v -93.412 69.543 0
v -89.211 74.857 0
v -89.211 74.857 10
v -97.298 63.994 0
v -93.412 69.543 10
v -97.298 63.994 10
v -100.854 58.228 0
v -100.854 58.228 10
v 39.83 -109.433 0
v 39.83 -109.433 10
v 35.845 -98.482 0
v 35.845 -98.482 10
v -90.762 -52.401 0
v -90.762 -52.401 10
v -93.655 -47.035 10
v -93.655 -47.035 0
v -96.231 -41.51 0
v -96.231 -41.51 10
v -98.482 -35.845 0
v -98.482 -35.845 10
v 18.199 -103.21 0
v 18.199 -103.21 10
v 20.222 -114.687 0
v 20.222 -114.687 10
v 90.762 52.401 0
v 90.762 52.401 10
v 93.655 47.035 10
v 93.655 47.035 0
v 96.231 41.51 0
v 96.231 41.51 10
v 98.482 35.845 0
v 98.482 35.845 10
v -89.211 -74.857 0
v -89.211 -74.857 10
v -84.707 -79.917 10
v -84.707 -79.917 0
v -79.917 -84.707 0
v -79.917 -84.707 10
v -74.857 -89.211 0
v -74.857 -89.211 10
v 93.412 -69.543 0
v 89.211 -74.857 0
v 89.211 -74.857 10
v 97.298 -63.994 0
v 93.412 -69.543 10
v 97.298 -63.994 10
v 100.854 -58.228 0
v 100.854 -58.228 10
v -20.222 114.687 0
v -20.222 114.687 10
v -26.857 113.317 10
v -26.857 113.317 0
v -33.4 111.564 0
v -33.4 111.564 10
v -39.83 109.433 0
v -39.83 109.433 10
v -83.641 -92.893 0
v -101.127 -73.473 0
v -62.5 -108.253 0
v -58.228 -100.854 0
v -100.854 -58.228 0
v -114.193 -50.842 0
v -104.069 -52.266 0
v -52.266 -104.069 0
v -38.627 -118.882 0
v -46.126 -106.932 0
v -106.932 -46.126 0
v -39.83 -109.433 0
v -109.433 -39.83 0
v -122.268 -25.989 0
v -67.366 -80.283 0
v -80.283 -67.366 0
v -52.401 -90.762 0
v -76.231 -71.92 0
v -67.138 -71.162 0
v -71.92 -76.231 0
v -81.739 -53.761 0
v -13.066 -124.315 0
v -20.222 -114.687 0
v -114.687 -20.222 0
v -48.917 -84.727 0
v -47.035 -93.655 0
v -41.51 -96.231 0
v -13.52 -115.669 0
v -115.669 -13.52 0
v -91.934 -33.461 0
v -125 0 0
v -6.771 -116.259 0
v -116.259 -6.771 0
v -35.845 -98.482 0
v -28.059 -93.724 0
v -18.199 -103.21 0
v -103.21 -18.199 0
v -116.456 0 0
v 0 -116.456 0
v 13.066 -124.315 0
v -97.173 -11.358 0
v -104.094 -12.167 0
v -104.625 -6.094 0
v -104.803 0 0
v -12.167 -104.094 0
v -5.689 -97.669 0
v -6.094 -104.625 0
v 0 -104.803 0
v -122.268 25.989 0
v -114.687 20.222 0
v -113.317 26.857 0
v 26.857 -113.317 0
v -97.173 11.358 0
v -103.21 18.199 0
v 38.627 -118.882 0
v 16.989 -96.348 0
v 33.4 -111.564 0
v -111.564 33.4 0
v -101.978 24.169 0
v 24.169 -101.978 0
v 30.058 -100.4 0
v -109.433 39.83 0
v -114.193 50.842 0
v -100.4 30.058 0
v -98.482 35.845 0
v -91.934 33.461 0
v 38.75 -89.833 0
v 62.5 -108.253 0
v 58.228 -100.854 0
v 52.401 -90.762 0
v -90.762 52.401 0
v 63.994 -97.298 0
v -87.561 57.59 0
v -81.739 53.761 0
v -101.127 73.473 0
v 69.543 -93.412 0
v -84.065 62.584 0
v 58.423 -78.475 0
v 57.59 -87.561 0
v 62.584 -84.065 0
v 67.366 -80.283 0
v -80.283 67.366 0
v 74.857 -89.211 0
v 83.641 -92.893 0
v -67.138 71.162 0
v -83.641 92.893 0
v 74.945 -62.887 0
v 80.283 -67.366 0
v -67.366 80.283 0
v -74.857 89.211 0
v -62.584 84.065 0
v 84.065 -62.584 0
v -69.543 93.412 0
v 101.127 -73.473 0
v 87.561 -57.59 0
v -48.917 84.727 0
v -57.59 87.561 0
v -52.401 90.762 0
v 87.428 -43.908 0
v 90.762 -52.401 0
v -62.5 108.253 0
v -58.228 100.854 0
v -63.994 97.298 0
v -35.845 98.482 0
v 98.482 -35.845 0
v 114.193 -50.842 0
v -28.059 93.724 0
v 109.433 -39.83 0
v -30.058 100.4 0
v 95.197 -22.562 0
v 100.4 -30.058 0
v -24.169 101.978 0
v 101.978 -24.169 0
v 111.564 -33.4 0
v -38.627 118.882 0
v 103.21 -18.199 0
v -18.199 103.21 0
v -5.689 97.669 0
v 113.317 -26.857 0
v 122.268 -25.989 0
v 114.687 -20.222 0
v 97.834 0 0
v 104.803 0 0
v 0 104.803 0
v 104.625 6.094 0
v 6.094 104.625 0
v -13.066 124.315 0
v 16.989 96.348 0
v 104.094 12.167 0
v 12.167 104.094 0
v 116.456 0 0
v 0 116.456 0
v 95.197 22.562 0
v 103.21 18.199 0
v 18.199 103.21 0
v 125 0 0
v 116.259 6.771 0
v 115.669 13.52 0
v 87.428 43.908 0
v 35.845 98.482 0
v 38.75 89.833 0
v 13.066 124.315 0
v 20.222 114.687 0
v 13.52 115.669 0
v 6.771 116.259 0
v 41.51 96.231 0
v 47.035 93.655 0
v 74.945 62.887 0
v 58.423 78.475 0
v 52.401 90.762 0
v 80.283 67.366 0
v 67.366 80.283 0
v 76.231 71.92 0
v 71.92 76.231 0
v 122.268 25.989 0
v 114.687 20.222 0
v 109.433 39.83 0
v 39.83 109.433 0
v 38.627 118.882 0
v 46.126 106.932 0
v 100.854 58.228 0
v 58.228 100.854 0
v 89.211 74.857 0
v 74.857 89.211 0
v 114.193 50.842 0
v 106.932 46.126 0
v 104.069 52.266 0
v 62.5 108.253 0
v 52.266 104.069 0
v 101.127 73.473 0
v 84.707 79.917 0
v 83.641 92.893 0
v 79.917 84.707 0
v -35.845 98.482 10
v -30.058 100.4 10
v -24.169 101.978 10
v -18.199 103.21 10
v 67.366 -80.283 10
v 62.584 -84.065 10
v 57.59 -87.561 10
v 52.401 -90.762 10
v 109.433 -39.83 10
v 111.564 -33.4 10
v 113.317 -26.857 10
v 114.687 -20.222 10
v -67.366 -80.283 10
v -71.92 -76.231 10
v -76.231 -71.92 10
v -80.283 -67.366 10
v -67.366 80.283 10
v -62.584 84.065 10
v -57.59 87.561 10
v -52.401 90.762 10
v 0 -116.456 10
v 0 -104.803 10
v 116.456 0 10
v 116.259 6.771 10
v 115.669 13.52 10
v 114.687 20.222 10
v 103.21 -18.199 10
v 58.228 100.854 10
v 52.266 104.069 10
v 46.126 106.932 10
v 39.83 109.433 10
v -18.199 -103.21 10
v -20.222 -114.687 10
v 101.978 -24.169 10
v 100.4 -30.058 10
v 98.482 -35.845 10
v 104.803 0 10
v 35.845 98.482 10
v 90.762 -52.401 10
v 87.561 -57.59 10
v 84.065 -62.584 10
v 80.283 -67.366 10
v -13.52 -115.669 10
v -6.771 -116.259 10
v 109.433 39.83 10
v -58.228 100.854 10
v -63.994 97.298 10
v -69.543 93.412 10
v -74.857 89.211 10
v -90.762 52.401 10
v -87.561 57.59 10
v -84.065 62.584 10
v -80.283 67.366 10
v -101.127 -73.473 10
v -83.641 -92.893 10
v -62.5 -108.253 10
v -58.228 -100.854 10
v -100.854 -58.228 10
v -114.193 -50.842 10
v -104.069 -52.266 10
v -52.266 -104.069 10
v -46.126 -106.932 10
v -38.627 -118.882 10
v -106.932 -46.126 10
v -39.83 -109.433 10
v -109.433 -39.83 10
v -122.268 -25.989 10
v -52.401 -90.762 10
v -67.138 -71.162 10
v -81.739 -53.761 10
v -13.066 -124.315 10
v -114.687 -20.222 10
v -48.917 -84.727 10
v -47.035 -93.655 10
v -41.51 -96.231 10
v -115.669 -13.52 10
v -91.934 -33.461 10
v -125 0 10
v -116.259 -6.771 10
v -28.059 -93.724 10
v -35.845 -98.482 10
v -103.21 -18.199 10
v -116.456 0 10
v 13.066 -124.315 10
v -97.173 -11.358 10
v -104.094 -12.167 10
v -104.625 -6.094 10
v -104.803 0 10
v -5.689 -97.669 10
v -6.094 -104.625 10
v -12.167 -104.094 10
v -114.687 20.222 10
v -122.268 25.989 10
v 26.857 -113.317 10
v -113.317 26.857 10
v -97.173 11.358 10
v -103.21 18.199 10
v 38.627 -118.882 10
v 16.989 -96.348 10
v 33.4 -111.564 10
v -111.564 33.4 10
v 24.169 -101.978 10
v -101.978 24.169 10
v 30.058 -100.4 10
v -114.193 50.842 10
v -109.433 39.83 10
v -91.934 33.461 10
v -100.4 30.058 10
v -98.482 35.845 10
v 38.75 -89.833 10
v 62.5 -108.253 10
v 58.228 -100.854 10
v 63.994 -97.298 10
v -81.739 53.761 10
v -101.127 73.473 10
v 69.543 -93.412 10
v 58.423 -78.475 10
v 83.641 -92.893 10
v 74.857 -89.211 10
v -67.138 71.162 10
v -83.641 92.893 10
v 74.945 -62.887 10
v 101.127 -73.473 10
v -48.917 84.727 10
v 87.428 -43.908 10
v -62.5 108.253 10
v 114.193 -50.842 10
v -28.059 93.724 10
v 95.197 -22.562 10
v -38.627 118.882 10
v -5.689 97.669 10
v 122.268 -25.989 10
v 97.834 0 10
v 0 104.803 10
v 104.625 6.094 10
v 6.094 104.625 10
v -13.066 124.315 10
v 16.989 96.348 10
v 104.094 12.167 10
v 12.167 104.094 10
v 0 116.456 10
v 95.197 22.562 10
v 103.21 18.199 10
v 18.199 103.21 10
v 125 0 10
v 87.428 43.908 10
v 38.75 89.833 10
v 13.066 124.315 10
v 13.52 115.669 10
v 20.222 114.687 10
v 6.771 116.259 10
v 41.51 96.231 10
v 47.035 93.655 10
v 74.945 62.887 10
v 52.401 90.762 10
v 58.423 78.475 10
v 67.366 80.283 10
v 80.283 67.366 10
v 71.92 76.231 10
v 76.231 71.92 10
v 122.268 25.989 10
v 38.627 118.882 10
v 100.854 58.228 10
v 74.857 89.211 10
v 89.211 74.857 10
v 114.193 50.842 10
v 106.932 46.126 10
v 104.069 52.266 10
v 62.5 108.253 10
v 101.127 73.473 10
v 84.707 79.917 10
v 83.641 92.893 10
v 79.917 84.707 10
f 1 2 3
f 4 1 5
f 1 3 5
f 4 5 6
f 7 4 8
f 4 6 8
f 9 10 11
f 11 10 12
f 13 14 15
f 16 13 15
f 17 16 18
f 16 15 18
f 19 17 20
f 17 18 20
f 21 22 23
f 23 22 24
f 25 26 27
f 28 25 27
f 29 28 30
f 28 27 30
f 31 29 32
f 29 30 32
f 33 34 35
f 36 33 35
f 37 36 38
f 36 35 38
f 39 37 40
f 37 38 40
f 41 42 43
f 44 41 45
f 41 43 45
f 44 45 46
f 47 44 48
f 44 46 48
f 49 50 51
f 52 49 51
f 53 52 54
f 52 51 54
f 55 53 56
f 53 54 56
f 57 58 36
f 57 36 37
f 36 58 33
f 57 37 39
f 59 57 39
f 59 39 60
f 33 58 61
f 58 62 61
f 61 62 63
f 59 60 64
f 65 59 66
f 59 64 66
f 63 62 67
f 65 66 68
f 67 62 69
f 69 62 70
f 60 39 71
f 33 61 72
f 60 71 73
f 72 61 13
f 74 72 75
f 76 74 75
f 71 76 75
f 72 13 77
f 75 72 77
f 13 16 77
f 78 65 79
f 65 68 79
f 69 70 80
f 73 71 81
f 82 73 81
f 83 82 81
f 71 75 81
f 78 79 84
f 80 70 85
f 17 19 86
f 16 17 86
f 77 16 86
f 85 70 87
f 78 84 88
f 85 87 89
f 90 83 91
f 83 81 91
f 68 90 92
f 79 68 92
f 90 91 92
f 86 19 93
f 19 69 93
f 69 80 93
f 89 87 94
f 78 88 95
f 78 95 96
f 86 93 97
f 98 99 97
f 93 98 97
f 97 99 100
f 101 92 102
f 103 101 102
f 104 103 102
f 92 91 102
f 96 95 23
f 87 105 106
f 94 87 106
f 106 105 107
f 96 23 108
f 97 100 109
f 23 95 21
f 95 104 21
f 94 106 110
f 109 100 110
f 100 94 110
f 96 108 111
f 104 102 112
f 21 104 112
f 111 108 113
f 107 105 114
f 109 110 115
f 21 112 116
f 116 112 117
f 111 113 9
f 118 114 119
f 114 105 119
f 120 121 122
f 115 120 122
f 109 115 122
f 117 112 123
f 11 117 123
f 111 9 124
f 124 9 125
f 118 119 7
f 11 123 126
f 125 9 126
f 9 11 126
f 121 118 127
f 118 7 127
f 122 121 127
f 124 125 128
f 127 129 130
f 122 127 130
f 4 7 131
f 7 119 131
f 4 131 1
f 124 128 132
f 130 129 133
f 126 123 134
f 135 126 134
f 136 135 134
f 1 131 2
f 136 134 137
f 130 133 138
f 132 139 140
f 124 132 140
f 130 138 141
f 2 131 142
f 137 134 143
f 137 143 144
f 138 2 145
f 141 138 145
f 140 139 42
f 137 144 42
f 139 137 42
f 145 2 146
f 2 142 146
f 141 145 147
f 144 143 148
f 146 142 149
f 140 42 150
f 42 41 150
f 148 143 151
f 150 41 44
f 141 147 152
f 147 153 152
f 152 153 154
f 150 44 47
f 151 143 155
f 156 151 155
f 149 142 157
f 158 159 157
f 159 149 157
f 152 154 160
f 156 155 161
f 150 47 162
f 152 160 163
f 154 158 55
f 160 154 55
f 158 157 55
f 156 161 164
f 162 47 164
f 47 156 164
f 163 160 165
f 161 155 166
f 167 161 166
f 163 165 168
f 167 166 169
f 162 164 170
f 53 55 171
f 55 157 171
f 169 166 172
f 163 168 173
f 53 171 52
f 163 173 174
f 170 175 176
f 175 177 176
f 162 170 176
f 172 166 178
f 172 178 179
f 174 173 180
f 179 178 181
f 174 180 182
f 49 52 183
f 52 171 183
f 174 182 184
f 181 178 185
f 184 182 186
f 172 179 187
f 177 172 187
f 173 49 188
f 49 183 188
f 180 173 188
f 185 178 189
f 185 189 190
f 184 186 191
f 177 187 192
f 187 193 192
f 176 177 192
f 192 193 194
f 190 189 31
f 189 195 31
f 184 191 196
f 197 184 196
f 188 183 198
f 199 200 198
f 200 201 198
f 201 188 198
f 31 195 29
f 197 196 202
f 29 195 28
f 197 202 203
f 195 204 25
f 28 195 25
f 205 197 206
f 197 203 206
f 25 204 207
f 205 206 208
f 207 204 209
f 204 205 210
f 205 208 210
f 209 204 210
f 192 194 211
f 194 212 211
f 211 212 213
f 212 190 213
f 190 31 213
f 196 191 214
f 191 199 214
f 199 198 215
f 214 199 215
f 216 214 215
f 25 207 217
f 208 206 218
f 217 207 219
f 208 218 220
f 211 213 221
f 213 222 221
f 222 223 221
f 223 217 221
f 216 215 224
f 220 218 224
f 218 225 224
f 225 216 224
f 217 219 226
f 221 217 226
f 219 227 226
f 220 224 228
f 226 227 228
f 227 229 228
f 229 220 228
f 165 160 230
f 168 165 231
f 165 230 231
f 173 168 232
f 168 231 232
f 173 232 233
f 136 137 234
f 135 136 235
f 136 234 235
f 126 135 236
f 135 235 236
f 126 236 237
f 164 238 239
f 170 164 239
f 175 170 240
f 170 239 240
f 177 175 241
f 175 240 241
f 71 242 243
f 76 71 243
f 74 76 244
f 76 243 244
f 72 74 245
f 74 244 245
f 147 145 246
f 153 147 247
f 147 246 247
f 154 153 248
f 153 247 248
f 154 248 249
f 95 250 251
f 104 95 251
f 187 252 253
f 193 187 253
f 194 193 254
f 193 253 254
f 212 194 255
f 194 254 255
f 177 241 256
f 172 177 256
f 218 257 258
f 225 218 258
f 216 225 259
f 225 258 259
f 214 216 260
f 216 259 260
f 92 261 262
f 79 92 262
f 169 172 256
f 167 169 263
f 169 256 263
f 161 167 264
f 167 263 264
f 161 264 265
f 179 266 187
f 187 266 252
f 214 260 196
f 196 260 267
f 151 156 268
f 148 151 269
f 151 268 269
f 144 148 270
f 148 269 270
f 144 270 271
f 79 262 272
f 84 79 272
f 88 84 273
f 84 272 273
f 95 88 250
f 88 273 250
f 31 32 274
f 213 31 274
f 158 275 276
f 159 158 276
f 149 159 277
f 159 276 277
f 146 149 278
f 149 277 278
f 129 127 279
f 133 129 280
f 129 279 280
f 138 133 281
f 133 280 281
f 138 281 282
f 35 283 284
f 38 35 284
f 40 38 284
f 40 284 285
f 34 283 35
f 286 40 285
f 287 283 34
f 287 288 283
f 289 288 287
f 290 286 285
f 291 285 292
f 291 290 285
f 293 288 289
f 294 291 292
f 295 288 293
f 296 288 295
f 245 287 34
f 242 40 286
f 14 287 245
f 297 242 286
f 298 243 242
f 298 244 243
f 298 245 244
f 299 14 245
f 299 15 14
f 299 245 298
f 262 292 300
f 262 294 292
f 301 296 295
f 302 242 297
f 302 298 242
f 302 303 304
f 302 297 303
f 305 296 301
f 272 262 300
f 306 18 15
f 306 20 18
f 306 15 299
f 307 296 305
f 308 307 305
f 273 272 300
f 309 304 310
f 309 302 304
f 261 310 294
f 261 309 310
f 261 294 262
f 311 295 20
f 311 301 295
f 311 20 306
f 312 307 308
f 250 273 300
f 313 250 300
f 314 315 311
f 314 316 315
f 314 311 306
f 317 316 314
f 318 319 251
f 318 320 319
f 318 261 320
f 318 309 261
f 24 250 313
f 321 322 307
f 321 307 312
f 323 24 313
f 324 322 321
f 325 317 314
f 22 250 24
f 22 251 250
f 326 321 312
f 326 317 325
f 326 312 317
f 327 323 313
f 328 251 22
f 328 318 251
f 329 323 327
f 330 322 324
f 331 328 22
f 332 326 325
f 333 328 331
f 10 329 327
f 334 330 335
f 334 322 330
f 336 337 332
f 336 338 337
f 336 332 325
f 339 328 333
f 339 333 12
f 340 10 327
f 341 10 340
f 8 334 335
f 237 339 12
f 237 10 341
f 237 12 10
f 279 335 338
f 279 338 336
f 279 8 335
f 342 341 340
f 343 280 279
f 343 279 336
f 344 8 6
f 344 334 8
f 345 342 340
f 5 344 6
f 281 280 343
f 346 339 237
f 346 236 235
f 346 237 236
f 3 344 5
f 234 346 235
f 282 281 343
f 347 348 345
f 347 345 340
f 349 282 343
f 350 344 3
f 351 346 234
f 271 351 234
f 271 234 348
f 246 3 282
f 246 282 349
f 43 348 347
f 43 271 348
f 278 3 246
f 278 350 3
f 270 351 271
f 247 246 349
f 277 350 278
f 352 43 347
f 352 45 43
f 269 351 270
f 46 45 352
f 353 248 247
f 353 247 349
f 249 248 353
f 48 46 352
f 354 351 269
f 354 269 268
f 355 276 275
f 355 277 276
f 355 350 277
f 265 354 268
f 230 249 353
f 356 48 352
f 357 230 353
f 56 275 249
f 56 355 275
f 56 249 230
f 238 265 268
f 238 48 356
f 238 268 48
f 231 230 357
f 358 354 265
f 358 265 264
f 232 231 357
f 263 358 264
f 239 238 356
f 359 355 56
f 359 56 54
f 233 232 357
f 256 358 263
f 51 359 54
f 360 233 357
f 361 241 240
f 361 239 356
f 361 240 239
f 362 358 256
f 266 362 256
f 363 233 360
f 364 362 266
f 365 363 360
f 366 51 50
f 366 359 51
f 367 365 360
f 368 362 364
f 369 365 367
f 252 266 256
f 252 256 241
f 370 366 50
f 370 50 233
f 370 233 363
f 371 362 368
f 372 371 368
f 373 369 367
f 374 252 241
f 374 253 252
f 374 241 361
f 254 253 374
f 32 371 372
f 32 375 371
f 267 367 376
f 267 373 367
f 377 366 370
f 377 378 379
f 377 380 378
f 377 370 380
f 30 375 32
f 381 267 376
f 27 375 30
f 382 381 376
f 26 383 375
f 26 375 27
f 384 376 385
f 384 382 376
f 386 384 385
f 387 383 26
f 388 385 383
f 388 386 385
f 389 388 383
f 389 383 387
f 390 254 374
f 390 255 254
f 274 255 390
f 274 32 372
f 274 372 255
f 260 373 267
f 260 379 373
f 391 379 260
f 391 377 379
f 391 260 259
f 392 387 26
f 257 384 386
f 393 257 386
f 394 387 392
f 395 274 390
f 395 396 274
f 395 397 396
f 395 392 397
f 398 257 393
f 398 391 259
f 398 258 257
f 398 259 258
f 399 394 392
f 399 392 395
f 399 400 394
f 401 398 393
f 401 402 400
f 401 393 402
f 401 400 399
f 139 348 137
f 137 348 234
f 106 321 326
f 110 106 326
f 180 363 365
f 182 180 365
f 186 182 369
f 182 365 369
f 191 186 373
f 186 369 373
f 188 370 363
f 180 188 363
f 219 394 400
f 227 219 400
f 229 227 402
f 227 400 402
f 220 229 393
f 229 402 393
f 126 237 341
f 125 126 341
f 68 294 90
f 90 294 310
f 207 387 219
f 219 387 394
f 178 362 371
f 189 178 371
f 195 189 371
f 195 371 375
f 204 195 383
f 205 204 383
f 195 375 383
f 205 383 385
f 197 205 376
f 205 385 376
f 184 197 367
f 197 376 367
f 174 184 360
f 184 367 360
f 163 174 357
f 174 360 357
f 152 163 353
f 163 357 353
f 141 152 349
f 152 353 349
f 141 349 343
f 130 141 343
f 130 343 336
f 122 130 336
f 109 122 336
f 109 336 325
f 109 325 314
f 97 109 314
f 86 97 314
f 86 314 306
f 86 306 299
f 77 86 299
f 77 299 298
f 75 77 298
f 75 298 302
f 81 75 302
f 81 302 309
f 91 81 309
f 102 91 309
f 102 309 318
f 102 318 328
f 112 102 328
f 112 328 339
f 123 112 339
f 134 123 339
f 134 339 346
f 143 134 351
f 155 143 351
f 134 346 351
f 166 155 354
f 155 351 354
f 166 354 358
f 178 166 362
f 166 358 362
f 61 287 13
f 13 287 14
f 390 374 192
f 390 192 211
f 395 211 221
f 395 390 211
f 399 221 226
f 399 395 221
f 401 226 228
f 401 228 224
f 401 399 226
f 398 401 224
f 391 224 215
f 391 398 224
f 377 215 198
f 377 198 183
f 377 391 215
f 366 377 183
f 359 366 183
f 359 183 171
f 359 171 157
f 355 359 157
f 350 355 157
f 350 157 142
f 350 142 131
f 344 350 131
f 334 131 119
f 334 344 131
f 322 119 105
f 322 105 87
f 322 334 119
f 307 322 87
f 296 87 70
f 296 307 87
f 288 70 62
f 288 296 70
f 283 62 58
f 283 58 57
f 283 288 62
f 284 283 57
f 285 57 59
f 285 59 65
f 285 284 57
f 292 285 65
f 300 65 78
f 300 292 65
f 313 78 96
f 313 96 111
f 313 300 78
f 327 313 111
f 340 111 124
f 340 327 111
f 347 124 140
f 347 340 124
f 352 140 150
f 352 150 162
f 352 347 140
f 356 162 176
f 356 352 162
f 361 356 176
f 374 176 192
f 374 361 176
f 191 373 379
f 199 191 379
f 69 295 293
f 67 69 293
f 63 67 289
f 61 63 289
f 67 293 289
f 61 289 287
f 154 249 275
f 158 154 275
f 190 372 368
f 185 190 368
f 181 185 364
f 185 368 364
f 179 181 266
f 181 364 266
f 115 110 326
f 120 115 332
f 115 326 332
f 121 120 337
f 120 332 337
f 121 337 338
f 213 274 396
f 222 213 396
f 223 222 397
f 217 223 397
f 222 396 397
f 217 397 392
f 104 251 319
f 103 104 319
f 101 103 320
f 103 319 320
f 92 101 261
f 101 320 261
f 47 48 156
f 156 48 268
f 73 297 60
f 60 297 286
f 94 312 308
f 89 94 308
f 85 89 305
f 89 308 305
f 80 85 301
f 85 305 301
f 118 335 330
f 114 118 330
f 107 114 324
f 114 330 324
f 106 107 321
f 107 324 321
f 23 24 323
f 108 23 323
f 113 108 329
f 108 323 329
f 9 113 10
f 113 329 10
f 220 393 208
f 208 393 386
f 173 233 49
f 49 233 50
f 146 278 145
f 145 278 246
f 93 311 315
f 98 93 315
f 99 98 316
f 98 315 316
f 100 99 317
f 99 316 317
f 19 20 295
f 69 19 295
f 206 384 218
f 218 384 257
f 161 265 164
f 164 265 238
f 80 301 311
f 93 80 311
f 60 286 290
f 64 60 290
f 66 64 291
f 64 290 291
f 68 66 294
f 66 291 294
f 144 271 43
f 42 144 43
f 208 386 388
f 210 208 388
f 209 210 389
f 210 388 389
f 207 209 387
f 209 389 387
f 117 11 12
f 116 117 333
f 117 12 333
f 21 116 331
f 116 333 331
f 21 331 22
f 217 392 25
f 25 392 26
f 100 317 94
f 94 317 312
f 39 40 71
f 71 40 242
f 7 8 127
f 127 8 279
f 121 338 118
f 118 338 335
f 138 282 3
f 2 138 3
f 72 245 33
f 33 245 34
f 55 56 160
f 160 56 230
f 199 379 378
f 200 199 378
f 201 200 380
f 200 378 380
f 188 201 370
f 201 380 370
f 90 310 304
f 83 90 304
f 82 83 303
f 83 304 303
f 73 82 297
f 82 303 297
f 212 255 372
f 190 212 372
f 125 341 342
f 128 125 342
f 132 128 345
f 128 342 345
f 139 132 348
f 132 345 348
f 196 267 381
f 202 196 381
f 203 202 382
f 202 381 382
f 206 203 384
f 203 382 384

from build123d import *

# Parameters (mm, degrees)
F0_R     = 50
F1_DEPTH = 10
F2_R     = 125
F2_R_2   = 40.44952
F3_DEPTH = 10
F5_DEPTH = 25
F6_R     = 97.834201
F7_DEPTH = 25


with BuildPart() as f1:
    # F0 (on Top) → F1 (new body)
    with BuildSketch(Plane.XY):
        Circle(F0_R)
        Polygon((-10, 30), (0, 30), (10, 30), (10, 10), (30, 10), (30, 0), (30, -10), (10, -10), (10, -30), (0, -30), (-10, -30), (-10, -10), (-30, -10), (-30, 0), (-30, 10), (-10, 10), align=None, mode=Mode.SUBTRACT)
    extrude(amount=F1_DEPTH)

    # F2 (on face) → F3 (join)
    with BuildSketch(Plane.XY.offset(10)):
        Circle(F2_R)
        Circle(F2_R_2, mode=Mode.SUBTRACT)
    extrude(amount=-F3_DEPTH)

    # F4 (on face) → F5 (cut)
    with BuildSketch(Plane.XY.offset(10)):
        with BuildLine():
            Line((0, 116.456337), (0, 104.802647))
            ThreePointArc((0, 104.802647), (9.134153, 104.403842), (18.198789, 103.21046))
            Line((18.198789, 103.21046), (20.222431, 114.687104))
            ThreePointArc((20.222431, 114.687104), (10.149839, 116.013186), (0, 116.456337))
        make_face()
        with BuildLine():
            ThreePointArc((-35.844616, 98.482274), (-27.124921, 101.231584), (-18.198789, 103.21046))
            Line((-18.198789, 103.21046), (-20.222431, 114.687104))
            ThreePointArc((-20.222431, 114.687104), (-30.141118, 112.488184), (-39.830413, 109.433161))
            Line((-39.830413, 109.433161), (-35.844616, 98.482274))
        make_face()
        with BuildLine():
            ThreePointArc((-67.365843, 80.283486), (-60.112329, 85.849303), (-52.401324, 90.761755))
            Line((-52.401324, 90.761755), (-58.228169, 100.854147))
            ThreePointArc((-58.228169, 100.854147), (-66.796611, 95.395447), (-74.856691, 89.21073))
            Line((-74.856691, 89.21073), (-67.365843, 80.283486))
        make_face()
        with BuildLine():
            ThreePointArc((-90.761755, 52.401324), (-85.849303, 60.112329), (-80.283486, 67.365843))
            Line((-80.283486, 67.365843), (-89.21073, 74.856691))
            ThreePointArc((-89.21073, 74.856691), (-95.395447, 66.796611), (-100.854147, 58.228169))
            Line((-100.854147, 58.228169), (-90.761755, 52.401324))
        make_face()
        with BuildLine():
            ThreePointArc((-103.21046, 18.198789), (-101.231584, 27.124921), (-98.482274, 35.844616))
            Line((-98.482274, 35.844616), (-109.433161, 39.830413))
            ThreePointArc((-109.433161, 39.830413), (-112.488184, 30.141118), (-114.687104, 20.222431))
            Line((-114.687104, 20.222431), (-103.21046, 18.198789))
        make_face()
        with BuildLine():
            ThreePointArc((-103.21046, -18.198789), (-104.403842, -9.134153), (-104.802647, 0))
            Line((-104.802647, 0), (-116.456337, 0))
            ThreePointArc((-116.456337, 0), (-116.013186, -10.149839), (-114.687104, -20.222431))
            Line((-114.687104, -20.222431), (-103.21046, -18.198789))
        make_face()
        with BuildLine():
            ThreePointArc((-90.761755, -52.401324), (-94.983455, -44.291513), (-98.482274, -35.844616))
            Line((-98.482274, -35.844616), (-109.433161, -39.830413))
            ThreePointArc((-109.433161, -39.830413), (-105.545285, -49.216575), (-100.854147, -58.228169))
            Line((-100.854147, -58.228169), (-90.761755, -52.401324))
        make_face()
        with BuildLine():
            ThreePointArc((-67.365843, -80.283486), (-74.106663, -74.106663), (-80.283486, -67.365843))
            Line((-80.283486, -67.365843), (-89.21073, -74.856691))
            ThreePointArc((-89.21073, -74.856691), (-82.347066, -82.347066), (-74.856691, -89.21073))
            Line((-74.856691, -89.21073), (-67.365843, -80.283486))
        make_face()
        with BuildLine():
            ThreePointArc((-35.844616, -98.482274), (-44.291513, -94.983455), (-52.401324, -90.761755))
            Line((-52.401324, -90.761755), (-58.228169, -100.854147))
            ThreePointArc((-58.228169, -100.854147), (-49.216575, -105.545285), (-39.830413, -109.433161))
            Line((-39.830413, -109.433161), (-35.844616, -98.482274))
        make_face()
        with BuildLine():
            ThreePointArc((0, -104.802647), (-9.134153, -104.403842), (-18.198789, -103.21046))
            Line((-18.198789, -103.21046), (-20.222431, -114.687104))
            ThreePointArc((-20.222431, -114.687104), (-10.149839, -116.013186), (0, -116.456337))
            Line((0, -116.456337), (0, -104.802647))
        make_face()
        with BuildLine():
            ThreePointArc((35.844616, -98.482274), (27.124921, -101.231584), (18.198789, -103.21046))
            Line((18.198789, -103.21046), (20.222431, -114.687104))
            ThreePointArc((20.222431, -114.687104), (30.141118, -112.488184), (39.830413, -109.433161))
            Line((39.830413, -109.433161), (35.844616, -98.482274))
        make_face()
        with BuildLine():
            ThreePointArc((67.365843, -80.283486), (60.112329, -85.849303), (52.401324, -90.761755))
            Line((52.401324, -90.761755), (58.228169, -100.854147))
            ThreePointArc((58.228169, -100.854147), (66.796611, -95.395447), (74.856691, -89.21073))
            Line((74.856691, -89.21073), (67.365843, -80.283486))
        make_face()
        with BuildLine():
            ThreePointArc((90.761755, -52.401324), (85.849303, -60.112329), (80.283486, -67.365843))
            Line((80.283486, -67.365843), (89.21073, -74.856691))
            ThreePointArc((89.21073, -74.856691), (95.395447, -66.796611), (100.854147, -58.228169))
            Line((100.854147, -58.228169), (90.761755, -52.401324))
        make_face()
        with BuildLine():
            ThreePointArc((103.21046, -18.198789), (101.231584, -27.124921), (98.482274, -35.844616))
            Line((98.482274, -35.844616), (109.433161, -39.830413))
            ThreePointArc((109.433161, -39.830413), (112.488184, -30.141118), (114.687104, -20.222431))
            Line((114.687104, -20.222431), (103.21046, -18.198789))
        make_face()
        with BuildLine():
            ThreePointArc((103.21046, 18.198789), (104.403842, 9.134153), (104.802647, 0))
            Line((104.802647, 0), (116.456337, 0))
            ThreePointArc((116.456337, 0), (116.013186, 10.149839), (114.687104, 20.222431))
            Line((114.687104, 20.222431), (103.21046, 18.198789))
        make_face()
        with BuildLine():
            ThreePointArc((90.761755, 52.401324), (94.983455, 44.291513), (98.482274, 35.844616))
            Line((98.482274, 35.844616), (109.433161, 39.830413))
            ThreePointArc((109.433161, 39.830413), (105.545285, 49.216575), (100.854147, 58.228169))
            Line((100.854147, 58.228169), (90.761755, 52.401324))
        make_face()
        with BuildLine():
            ThreePointArc((67.365843, 80.283486), (74.106663, 74.106663), (80.283486, 67.365843))
            Line((80.283486, 67.365843), (89.21073, 74.856691))
            ThreePointArc((89.21073, 74.856691), (82.347066, 82.347066), (74.856691, 89.21073))
            Line((74.856691, 89.21073), (67.365843, 80.283486))
        make_face()
        with BuildLine():
            ThreePointArc((35.844616, 98.482274), (44.291513, 94.983455), (52.401324, 90.761755))
            Line((52.401324, 90.761755), (58.228169, 100.854147))
            ThreePointArc((58.228169, 100.854147), (49.216575, 105.545285), (39.830413, 109.433161))
            Line((39.830413, 109.433161), (35.844616, 98.482274))
        make_face()
    extrude(amount=-F5_DEPTH, mode=Mode.SUBTRACT)

    # F6 (on face) → F7 (cut)
    with BuildSketch(Plane.XY.offset(10)):
        Circle(F6_R)
    extrude(amount=-F7_DEPTH, mode=Mode.SUBTRACT)


solid = f1.part
